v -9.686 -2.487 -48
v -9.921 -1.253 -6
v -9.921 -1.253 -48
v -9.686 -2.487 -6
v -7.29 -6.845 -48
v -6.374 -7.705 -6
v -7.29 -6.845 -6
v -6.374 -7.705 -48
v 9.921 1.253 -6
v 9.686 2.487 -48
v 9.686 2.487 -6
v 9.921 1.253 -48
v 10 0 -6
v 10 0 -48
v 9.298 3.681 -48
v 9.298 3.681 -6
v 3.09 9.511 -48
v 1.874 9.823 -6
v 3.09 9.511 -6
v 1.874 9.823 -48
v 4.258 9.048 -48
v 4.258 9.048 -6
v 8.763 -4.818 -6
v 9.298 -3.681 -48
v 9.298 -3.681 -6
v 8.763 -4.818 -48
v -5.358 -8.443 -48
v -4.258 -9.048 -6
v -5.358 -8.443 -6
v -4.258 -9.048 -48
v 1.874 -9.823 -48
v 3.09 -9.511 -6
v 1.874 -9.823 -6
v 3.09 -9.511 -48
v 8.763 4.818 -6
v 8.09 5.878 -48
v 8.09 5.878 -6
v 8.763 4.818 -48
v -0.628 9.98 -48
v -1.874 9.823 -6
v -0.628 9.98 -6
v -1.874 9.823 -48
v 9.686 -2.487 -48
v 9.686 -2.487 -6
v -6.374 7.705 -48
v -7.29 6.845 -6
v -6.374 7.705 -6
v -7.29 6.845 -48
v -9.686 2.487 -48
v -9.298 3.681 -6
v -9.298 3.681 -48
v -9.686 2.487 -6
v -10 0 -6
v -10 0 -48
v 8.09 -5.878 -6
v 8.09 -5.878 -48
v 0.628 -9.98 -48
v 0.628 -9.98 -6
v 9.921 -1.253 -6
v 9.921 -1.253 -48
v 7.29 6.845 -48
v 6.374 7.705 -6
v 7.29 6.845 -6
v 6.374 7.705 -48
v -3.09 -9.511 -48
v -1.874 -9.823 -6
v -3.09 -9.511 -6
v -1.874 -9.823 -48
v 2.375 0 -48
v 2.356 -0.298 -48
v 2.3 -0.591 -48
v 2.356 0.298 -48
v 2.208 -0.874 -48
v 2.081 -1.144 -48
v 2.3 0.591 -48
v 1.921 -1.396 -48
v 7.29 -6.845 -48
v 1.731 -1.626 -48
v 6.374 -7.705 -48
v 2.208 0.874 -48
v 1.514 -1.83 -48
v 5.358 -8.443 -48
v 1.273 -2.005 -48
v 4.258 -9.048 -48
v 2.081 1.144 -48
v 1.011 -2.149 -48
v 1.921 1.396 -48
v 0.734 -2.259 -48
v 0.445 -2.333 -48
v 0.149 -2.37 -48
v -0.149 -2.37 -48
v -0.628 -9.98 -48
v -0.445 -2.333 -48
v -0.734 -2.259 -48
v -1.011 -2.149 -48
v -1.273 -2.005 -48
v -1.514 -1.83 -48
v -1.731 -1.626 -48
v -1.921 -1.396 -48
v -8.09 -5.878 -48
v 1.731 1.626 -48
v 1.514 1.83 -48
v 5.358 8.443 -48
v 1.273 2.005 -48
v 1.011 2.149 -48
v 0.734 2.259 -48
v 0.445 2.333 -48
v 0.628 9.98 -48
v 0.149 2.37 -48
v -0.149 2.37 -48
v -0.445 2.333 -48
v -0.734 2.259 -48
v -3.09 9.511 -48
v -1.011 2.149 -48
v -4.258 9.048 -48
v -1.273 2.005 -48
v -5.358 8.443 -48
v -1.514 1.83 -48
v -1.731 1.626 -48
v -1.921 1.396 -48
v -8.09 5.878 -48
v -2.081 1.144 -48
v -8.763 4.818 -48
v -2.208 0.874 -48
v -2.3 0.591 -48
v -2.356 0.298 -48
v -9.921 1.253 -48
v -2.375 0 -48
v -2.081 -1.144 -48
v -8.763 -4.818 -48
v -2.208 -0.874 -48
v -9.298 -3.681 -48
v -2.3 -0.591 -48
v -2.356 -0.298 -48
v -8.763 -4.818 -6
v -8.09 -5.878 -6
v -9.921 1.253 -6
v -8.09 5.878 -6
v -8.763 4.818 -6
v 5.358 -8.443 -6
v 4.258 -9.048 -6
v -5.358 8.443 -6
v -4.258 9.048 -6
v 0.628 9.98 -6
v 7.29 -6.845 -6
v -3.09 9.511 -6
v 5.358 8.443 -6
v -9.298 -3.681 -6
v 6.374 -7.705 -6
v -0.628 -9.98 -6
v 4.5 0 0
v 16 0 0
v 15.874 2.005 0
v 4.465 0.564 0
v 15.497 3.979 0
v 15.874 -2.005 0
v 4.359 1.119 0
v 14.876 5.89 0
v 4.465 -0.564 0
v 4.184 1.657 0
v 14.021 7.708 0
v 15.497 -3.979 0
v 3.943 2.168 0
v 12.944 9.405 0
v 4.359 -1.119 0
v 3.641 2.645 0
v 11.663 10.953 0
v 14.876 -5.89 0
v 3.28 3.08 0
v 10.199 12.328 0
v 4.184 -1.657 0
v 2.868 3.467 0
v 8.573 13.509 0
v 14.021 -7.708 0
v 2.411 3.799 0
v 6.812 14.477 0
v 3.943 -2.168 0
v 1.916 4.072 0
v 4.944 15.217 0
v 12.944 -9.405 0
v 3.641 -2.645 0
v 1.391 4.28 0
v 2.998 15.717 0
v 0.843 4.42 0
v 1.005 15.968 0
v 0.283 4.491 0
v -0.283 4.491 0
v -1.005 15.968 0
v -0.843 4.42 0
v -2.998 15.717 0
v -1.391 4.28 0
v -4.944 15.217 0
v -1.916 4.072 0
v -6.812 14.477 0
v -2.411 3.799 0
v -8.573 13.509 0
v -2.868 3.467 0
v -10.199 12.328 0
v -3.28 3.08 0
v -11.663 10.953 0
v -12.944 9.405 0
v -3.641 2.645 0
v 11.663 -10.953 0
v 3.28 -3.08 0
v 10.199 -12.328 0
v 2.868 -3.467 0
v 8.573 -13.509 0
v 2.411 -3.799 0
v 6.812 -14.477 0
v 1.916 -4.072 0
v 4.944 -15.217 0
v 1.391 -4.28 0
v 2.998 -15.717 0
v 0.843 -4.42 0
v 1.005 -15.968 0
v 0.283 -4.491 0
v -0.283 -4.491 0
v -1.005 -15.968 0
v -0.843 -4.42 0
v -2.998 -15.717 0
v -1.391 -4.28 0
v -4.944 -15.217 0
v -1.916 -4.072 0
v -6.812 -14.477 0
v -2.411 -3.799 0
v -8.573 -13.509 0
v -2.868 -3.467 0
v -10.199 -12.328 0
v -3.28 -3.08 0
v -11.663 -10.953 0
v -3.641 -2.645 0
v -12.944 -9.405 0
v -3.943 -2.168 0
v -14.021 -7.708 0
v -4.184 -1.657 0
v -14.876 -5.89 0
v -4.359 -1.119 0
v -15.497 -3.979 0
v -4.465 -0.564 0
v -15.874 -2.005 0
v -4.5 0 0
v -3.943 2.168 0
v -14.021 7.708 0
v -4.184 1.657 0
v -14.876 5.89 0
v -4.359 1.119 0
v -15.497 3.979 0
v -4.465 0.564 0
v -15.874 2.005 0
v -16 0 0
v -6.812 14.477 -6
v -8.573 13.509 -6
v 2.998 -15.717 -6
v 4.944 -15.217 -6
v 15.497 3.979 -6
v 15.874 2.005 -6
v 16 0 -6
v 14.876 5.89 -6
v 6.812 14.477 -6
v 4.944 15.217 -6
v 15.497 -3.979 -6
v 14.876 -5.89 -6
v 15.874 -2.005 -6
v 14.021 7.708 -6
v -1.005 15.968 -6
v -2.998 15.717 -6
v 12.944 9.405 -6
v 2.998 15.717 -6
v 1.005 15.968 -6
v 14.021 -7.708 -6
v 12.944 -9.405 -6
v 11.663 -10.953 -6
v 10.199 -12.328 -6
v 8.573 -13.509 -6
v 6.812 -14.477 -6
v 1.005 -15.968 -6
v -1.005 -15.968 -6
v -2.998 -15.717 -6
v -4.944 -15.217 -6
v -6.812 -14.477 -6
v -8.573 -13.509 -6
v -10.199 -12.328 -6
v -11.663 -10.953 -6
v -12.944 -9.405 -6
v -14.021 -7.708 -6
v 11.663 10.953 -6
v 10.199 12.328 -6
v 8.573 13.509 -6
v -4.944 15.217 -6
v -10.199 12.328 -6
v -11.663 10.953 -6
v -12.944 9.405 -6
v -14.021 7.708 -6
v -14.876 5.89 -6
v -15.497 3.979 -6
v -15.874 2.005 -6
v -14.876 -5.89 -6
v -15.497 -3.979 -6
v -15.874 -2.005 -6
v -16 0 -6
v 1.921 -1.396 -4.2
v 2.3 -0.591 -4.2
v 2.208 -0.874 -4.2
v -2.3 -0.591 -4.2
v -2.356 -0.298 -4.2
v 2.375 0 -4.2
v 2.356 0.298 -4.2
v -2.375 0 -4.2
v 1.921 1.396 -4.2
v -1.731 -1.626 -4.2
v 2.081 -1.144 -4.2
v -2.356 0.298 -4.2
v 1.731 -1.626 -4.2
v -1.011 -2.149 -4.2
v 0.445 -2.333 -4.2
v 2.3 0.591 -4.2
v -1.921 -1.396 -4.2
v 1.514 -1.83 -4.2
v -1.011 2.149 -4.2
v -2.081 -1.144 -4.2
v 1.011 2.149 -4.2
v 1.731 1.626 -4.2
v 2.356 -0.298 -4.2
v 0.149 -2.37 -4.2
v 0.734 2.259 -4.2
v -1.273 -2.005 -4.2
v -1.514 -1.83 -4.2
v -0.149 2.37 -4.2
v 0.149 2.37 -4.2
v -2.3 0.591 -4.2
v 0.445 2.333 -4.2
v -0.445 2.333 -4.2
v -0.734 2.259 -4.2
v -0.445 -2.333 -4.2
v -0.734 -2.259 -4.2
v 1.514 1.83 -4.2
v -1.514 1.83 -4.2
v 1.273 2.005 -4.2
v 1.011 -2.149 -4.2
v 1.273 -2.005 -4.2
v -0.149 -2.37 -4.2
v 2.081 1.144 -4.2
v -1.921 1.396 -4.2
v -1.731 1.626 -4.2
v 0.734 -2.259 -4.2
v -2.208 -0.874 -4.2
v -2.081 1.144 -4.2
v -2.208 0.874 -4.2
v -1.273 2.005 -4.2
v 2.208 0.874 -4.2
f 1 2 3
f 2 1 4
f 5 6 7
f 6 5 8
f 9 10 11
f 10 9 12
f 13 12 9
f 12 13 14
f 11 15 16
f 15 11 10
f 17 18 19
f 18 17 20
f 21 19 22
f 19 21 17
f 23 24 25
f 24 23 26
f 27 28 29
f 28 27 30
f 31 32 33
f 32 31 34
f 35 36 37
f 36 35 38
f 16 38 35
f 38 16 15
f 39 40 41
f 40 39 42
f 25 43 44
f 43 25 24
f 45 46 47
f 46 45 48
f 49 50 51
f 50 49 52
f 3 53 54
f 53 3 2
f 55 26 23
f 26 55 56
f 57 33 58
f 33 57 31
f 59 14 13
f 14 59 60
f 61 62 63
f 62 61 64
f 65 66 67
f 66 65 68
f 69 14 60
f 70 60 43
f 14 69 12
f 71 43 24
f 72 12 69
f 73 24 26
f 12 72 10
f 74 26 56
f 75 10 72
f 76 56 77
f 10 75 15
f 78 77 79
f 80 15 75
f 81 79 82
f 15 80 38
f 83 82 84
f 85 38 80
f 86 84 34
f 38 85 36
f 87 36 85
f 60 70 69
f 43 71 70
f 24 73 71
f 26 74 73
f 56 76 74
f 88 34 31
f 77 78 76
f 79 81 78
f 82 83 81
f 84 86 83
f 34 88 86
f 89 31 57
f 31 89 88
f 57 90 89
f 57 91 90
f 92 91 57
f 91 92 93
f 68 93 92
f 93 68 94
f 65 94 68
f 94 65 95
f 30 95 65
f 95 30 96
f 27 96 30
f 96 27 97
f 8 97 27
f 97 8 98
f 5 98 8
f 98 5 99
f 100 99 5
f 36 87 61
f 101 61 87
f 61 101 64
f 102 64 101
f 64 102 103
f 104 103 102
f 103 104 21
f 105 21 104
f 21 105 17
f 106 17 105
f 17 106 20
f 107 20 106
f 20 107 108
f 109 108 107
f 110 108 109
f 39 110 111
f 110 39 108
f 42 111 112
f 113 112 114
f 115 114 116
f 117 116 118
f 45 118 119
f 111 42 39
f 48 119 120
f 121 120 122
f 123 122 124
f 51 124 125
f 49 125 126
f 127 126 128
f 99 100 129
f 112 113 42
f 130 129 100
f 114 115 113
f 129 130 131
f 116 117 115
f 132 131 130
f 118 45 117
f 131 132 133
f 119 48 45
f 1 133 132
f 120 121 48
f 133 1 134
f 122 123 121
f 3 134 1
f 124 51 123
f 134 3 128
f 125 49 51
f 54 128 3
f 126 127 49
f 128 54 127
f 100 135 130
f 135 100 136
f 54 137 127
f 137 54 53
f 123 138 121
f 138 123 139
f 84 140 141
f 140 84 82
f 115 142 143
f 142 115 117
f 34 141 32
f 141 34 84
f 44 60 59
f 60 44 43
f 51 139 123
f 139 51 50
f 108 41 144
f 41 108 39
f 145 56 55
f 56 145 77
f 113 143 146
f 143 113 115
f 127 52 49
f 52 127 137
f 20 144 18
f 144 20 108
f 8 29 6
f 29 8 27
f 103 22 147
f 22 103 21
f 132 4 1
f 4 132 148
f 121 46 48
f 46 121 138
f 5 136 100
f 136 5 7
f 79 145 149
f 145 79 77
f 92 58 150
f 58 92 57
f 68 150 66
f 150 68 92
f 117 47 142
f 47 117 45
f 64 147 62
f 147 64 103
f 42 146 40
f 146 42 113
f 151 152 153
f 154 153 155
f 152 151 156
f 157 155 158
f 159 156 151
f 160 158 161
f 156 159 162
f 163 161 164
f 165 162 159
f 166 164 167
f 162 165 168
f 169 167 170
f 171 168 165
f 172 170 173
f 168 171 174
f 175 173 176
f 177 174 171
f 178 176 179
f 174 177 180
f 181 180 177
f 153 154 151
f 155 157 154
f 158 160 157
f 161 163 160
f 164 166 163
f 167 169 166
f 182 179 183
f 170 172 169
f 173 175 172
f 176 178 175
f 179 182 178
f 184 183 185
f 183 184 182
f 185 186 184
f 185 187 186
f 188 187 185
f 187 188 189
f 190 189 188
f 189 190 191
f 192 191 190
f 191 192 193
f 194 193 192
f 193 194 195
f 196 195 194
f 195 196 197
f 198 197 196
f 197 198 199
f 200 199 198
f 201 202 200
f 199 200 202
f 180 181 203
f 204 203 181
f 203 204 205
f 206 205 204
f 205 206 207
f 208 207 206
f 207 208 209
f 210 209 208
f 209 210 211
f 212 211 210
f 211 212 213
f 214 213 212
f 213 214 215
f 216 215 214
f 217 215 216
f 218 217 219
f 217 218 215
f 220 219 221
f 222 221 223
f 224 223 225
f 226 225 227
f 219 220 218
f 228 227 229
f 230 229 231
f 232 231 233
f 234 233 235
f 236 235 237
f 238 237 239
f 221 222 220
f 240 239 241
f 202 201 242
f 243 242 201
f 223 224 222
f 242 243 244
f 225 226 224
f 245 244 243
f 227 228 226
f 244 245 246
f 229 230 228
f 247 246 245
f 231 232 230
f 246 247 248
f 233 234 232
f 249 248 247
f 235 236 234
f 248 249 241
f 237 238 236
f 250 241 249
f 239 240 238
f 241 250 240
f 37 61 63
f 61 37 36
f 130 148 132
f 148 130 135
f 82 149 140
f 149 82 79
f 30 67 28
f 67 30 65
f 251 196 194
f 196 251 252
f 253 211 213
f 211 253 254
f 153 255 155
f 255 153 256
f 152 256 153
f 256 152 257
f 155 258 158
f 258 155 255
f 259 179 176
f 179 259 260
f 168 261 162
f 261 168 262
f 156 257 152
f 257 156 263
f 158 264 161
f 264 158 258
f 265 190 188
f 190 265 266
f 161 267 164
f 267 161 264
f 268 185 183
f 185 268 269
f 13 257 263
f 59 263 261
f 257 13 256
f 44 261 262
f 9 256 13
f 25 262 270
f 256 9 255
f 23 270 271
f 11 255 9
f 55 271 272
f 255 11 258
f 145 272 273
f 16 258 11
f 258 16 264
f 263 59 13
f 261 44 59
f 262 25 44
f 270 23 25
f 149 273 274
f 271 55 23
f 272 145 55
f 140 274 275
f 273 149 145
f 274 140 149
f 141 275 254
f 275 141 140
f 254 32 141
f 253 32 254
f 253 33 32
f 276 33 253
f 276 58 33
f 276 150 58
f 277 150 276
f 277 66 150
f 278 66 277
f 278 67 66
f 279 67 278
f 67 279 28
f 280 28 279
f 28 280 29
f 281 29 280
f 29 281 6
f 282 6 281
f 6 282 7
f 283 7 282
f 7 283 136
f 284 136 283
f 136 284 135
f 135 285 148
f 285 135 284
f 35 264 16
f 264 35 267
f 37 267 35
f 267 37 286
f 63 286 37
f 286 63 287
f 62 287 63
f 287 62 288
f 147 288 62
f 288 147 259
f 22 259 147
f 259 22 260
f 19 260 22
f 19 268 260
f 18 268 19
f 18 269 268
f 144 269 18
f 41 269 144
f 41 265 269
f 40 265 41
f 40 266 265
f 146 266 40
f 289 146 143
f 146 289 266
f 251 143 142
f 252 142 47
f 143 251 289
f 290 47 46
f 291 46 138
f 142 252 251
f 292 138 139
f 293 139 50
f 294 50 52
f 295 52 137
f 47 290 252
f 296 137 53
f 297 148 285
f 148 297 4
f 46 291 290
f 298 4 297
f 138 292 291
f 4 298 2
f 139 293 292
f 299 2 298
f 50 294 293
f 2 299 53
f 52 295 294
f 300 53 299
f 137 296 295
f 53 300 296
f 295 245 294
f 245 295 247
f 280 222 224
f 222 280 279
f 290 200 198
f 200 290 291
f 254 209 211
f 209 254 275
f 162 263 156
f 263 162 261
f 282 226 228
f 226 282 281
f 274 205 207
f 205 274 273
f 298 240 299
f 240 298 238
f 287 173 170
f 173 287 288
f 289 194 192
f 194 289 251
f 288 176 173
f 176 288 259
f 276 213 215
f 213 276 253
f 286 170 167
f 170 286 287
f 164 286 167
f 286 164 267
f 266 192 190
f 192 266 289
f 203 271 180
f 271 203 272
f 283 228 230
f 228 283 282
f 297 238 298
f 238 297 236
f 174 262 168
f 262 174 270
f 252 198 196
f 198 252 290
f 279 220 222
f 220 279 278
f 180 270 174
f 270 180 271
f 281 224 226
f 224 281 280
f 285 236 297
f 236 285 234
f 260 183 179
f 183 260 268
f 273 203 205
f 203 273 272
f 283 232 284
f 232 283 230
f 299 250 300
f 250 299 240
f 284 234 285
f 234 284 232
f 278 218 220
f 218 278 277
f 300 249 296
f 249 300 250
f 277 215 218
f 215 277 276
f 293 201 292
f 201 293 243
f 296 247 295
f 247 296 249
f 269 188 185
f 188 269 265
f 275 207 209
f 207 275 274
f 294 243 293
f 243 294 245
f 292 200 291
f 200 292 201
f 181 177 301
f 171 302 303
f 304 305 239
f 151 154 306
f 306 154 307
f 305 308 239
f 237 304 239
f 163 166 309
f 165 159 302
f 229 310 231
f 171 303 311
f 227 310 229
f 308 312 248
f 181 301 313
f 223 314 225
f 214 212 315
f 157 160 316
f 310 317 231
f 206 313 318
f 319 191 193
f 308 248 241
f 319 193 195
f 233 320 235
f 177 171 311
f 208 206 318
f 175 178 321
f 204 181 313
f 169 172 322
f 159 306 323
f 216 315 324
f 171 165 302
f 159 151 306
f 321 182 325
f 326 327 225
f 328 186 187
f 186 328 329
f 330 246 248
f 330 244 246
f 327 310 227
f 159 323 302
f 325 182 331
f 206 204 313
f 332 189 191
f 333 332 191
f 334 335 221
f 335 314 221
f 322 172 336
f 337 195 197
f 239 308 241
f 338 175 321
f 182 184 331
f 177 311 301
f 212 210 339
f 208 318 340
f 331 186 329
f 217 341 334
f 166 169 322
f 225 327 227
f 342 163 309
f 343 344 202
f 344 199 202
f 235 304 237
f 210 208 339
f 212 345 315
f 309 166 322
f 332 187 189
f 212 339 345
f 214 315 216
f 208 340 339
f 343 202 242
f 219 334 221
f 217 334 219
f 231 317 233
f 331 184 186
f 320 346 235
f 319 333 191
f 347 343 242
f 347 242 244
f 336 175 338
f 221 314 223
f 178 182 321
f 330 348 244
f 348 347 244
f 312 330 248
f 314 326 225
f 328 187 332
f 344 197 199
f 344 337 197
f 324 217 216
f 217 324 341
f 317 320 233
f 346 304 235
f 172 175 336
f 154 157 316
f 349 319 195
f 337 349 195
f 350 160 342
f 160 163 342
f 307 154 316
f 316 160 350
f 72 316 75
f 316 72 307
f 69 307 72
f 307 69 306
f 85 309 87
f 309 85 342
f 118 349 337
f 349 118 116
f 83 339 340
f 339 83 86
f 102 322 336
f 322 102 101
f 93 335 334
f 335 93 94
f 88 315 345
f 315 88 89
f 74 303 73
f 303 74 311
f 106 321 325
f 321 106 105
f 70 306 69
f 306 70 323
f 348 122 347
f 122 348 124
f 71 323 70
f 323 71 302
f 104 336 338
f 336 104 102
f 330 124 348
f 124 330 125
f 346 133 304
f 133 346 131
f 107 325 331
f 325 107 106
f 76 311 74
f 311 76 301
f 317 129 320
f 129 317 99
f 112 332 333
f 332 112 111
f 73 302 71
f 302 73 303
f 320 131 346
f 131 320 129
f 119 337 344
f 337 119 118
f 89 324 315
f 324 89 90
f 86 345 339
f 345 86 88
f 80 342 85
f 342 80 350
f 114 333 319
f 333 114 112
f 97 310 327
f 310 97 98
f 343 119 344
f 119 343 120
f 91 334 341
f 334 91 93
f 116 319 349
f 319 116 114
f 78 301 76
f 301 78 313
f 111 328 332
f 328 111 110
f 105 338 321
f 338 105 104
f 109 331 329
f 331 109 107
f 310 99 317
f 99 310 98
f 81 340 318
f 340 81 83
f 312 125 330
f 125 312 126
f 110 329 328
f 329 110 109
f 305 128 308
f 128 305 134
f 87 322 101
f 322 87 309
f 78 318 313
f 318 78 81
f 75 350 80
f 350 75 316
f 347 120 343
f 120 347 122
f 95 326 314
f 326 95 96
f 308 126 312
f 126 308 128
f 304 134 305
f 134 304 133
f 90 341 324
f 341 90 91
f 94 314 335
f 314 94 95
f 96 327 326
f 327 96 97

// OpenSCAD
$fn = 50;


difference() {
	union() {
		translate(v = [0, 0, -48.0000000000]) {
			cylinder(h = 48, r = 10.0000000000);
		}
		translate(v = [0, 0, -6.0000000000]) {
			cylinder(h = 6, r = 16.0000000000);
		}
	}
	union() {
		translate(v = [0, 0, 0]) {
			rotate(a = [0, 0, 0]) {
				difference() {
					union() {
						#translate(v = [0, 0, -48.0000000000]) {
							cylinder(h = 48, r = 2.2500000000);
						}
						#translate(v = [0, 0, -4.2000000000]) {
							cylinder(h = 4.2000000000, r1 = 2.3750000000, r2 = 4.5000000000);
						}
						#translate(v = [0, 0, -48.0000000000]) {
							cylinder(h = 48, r = 2.3750000000);
						}
						#translate(v = [0, 0, -48.0000000000]) {
							cylinder(h = 48, r = 2.2500000000);
						}
					}
					union();
				}
			}
		}
	}
}
